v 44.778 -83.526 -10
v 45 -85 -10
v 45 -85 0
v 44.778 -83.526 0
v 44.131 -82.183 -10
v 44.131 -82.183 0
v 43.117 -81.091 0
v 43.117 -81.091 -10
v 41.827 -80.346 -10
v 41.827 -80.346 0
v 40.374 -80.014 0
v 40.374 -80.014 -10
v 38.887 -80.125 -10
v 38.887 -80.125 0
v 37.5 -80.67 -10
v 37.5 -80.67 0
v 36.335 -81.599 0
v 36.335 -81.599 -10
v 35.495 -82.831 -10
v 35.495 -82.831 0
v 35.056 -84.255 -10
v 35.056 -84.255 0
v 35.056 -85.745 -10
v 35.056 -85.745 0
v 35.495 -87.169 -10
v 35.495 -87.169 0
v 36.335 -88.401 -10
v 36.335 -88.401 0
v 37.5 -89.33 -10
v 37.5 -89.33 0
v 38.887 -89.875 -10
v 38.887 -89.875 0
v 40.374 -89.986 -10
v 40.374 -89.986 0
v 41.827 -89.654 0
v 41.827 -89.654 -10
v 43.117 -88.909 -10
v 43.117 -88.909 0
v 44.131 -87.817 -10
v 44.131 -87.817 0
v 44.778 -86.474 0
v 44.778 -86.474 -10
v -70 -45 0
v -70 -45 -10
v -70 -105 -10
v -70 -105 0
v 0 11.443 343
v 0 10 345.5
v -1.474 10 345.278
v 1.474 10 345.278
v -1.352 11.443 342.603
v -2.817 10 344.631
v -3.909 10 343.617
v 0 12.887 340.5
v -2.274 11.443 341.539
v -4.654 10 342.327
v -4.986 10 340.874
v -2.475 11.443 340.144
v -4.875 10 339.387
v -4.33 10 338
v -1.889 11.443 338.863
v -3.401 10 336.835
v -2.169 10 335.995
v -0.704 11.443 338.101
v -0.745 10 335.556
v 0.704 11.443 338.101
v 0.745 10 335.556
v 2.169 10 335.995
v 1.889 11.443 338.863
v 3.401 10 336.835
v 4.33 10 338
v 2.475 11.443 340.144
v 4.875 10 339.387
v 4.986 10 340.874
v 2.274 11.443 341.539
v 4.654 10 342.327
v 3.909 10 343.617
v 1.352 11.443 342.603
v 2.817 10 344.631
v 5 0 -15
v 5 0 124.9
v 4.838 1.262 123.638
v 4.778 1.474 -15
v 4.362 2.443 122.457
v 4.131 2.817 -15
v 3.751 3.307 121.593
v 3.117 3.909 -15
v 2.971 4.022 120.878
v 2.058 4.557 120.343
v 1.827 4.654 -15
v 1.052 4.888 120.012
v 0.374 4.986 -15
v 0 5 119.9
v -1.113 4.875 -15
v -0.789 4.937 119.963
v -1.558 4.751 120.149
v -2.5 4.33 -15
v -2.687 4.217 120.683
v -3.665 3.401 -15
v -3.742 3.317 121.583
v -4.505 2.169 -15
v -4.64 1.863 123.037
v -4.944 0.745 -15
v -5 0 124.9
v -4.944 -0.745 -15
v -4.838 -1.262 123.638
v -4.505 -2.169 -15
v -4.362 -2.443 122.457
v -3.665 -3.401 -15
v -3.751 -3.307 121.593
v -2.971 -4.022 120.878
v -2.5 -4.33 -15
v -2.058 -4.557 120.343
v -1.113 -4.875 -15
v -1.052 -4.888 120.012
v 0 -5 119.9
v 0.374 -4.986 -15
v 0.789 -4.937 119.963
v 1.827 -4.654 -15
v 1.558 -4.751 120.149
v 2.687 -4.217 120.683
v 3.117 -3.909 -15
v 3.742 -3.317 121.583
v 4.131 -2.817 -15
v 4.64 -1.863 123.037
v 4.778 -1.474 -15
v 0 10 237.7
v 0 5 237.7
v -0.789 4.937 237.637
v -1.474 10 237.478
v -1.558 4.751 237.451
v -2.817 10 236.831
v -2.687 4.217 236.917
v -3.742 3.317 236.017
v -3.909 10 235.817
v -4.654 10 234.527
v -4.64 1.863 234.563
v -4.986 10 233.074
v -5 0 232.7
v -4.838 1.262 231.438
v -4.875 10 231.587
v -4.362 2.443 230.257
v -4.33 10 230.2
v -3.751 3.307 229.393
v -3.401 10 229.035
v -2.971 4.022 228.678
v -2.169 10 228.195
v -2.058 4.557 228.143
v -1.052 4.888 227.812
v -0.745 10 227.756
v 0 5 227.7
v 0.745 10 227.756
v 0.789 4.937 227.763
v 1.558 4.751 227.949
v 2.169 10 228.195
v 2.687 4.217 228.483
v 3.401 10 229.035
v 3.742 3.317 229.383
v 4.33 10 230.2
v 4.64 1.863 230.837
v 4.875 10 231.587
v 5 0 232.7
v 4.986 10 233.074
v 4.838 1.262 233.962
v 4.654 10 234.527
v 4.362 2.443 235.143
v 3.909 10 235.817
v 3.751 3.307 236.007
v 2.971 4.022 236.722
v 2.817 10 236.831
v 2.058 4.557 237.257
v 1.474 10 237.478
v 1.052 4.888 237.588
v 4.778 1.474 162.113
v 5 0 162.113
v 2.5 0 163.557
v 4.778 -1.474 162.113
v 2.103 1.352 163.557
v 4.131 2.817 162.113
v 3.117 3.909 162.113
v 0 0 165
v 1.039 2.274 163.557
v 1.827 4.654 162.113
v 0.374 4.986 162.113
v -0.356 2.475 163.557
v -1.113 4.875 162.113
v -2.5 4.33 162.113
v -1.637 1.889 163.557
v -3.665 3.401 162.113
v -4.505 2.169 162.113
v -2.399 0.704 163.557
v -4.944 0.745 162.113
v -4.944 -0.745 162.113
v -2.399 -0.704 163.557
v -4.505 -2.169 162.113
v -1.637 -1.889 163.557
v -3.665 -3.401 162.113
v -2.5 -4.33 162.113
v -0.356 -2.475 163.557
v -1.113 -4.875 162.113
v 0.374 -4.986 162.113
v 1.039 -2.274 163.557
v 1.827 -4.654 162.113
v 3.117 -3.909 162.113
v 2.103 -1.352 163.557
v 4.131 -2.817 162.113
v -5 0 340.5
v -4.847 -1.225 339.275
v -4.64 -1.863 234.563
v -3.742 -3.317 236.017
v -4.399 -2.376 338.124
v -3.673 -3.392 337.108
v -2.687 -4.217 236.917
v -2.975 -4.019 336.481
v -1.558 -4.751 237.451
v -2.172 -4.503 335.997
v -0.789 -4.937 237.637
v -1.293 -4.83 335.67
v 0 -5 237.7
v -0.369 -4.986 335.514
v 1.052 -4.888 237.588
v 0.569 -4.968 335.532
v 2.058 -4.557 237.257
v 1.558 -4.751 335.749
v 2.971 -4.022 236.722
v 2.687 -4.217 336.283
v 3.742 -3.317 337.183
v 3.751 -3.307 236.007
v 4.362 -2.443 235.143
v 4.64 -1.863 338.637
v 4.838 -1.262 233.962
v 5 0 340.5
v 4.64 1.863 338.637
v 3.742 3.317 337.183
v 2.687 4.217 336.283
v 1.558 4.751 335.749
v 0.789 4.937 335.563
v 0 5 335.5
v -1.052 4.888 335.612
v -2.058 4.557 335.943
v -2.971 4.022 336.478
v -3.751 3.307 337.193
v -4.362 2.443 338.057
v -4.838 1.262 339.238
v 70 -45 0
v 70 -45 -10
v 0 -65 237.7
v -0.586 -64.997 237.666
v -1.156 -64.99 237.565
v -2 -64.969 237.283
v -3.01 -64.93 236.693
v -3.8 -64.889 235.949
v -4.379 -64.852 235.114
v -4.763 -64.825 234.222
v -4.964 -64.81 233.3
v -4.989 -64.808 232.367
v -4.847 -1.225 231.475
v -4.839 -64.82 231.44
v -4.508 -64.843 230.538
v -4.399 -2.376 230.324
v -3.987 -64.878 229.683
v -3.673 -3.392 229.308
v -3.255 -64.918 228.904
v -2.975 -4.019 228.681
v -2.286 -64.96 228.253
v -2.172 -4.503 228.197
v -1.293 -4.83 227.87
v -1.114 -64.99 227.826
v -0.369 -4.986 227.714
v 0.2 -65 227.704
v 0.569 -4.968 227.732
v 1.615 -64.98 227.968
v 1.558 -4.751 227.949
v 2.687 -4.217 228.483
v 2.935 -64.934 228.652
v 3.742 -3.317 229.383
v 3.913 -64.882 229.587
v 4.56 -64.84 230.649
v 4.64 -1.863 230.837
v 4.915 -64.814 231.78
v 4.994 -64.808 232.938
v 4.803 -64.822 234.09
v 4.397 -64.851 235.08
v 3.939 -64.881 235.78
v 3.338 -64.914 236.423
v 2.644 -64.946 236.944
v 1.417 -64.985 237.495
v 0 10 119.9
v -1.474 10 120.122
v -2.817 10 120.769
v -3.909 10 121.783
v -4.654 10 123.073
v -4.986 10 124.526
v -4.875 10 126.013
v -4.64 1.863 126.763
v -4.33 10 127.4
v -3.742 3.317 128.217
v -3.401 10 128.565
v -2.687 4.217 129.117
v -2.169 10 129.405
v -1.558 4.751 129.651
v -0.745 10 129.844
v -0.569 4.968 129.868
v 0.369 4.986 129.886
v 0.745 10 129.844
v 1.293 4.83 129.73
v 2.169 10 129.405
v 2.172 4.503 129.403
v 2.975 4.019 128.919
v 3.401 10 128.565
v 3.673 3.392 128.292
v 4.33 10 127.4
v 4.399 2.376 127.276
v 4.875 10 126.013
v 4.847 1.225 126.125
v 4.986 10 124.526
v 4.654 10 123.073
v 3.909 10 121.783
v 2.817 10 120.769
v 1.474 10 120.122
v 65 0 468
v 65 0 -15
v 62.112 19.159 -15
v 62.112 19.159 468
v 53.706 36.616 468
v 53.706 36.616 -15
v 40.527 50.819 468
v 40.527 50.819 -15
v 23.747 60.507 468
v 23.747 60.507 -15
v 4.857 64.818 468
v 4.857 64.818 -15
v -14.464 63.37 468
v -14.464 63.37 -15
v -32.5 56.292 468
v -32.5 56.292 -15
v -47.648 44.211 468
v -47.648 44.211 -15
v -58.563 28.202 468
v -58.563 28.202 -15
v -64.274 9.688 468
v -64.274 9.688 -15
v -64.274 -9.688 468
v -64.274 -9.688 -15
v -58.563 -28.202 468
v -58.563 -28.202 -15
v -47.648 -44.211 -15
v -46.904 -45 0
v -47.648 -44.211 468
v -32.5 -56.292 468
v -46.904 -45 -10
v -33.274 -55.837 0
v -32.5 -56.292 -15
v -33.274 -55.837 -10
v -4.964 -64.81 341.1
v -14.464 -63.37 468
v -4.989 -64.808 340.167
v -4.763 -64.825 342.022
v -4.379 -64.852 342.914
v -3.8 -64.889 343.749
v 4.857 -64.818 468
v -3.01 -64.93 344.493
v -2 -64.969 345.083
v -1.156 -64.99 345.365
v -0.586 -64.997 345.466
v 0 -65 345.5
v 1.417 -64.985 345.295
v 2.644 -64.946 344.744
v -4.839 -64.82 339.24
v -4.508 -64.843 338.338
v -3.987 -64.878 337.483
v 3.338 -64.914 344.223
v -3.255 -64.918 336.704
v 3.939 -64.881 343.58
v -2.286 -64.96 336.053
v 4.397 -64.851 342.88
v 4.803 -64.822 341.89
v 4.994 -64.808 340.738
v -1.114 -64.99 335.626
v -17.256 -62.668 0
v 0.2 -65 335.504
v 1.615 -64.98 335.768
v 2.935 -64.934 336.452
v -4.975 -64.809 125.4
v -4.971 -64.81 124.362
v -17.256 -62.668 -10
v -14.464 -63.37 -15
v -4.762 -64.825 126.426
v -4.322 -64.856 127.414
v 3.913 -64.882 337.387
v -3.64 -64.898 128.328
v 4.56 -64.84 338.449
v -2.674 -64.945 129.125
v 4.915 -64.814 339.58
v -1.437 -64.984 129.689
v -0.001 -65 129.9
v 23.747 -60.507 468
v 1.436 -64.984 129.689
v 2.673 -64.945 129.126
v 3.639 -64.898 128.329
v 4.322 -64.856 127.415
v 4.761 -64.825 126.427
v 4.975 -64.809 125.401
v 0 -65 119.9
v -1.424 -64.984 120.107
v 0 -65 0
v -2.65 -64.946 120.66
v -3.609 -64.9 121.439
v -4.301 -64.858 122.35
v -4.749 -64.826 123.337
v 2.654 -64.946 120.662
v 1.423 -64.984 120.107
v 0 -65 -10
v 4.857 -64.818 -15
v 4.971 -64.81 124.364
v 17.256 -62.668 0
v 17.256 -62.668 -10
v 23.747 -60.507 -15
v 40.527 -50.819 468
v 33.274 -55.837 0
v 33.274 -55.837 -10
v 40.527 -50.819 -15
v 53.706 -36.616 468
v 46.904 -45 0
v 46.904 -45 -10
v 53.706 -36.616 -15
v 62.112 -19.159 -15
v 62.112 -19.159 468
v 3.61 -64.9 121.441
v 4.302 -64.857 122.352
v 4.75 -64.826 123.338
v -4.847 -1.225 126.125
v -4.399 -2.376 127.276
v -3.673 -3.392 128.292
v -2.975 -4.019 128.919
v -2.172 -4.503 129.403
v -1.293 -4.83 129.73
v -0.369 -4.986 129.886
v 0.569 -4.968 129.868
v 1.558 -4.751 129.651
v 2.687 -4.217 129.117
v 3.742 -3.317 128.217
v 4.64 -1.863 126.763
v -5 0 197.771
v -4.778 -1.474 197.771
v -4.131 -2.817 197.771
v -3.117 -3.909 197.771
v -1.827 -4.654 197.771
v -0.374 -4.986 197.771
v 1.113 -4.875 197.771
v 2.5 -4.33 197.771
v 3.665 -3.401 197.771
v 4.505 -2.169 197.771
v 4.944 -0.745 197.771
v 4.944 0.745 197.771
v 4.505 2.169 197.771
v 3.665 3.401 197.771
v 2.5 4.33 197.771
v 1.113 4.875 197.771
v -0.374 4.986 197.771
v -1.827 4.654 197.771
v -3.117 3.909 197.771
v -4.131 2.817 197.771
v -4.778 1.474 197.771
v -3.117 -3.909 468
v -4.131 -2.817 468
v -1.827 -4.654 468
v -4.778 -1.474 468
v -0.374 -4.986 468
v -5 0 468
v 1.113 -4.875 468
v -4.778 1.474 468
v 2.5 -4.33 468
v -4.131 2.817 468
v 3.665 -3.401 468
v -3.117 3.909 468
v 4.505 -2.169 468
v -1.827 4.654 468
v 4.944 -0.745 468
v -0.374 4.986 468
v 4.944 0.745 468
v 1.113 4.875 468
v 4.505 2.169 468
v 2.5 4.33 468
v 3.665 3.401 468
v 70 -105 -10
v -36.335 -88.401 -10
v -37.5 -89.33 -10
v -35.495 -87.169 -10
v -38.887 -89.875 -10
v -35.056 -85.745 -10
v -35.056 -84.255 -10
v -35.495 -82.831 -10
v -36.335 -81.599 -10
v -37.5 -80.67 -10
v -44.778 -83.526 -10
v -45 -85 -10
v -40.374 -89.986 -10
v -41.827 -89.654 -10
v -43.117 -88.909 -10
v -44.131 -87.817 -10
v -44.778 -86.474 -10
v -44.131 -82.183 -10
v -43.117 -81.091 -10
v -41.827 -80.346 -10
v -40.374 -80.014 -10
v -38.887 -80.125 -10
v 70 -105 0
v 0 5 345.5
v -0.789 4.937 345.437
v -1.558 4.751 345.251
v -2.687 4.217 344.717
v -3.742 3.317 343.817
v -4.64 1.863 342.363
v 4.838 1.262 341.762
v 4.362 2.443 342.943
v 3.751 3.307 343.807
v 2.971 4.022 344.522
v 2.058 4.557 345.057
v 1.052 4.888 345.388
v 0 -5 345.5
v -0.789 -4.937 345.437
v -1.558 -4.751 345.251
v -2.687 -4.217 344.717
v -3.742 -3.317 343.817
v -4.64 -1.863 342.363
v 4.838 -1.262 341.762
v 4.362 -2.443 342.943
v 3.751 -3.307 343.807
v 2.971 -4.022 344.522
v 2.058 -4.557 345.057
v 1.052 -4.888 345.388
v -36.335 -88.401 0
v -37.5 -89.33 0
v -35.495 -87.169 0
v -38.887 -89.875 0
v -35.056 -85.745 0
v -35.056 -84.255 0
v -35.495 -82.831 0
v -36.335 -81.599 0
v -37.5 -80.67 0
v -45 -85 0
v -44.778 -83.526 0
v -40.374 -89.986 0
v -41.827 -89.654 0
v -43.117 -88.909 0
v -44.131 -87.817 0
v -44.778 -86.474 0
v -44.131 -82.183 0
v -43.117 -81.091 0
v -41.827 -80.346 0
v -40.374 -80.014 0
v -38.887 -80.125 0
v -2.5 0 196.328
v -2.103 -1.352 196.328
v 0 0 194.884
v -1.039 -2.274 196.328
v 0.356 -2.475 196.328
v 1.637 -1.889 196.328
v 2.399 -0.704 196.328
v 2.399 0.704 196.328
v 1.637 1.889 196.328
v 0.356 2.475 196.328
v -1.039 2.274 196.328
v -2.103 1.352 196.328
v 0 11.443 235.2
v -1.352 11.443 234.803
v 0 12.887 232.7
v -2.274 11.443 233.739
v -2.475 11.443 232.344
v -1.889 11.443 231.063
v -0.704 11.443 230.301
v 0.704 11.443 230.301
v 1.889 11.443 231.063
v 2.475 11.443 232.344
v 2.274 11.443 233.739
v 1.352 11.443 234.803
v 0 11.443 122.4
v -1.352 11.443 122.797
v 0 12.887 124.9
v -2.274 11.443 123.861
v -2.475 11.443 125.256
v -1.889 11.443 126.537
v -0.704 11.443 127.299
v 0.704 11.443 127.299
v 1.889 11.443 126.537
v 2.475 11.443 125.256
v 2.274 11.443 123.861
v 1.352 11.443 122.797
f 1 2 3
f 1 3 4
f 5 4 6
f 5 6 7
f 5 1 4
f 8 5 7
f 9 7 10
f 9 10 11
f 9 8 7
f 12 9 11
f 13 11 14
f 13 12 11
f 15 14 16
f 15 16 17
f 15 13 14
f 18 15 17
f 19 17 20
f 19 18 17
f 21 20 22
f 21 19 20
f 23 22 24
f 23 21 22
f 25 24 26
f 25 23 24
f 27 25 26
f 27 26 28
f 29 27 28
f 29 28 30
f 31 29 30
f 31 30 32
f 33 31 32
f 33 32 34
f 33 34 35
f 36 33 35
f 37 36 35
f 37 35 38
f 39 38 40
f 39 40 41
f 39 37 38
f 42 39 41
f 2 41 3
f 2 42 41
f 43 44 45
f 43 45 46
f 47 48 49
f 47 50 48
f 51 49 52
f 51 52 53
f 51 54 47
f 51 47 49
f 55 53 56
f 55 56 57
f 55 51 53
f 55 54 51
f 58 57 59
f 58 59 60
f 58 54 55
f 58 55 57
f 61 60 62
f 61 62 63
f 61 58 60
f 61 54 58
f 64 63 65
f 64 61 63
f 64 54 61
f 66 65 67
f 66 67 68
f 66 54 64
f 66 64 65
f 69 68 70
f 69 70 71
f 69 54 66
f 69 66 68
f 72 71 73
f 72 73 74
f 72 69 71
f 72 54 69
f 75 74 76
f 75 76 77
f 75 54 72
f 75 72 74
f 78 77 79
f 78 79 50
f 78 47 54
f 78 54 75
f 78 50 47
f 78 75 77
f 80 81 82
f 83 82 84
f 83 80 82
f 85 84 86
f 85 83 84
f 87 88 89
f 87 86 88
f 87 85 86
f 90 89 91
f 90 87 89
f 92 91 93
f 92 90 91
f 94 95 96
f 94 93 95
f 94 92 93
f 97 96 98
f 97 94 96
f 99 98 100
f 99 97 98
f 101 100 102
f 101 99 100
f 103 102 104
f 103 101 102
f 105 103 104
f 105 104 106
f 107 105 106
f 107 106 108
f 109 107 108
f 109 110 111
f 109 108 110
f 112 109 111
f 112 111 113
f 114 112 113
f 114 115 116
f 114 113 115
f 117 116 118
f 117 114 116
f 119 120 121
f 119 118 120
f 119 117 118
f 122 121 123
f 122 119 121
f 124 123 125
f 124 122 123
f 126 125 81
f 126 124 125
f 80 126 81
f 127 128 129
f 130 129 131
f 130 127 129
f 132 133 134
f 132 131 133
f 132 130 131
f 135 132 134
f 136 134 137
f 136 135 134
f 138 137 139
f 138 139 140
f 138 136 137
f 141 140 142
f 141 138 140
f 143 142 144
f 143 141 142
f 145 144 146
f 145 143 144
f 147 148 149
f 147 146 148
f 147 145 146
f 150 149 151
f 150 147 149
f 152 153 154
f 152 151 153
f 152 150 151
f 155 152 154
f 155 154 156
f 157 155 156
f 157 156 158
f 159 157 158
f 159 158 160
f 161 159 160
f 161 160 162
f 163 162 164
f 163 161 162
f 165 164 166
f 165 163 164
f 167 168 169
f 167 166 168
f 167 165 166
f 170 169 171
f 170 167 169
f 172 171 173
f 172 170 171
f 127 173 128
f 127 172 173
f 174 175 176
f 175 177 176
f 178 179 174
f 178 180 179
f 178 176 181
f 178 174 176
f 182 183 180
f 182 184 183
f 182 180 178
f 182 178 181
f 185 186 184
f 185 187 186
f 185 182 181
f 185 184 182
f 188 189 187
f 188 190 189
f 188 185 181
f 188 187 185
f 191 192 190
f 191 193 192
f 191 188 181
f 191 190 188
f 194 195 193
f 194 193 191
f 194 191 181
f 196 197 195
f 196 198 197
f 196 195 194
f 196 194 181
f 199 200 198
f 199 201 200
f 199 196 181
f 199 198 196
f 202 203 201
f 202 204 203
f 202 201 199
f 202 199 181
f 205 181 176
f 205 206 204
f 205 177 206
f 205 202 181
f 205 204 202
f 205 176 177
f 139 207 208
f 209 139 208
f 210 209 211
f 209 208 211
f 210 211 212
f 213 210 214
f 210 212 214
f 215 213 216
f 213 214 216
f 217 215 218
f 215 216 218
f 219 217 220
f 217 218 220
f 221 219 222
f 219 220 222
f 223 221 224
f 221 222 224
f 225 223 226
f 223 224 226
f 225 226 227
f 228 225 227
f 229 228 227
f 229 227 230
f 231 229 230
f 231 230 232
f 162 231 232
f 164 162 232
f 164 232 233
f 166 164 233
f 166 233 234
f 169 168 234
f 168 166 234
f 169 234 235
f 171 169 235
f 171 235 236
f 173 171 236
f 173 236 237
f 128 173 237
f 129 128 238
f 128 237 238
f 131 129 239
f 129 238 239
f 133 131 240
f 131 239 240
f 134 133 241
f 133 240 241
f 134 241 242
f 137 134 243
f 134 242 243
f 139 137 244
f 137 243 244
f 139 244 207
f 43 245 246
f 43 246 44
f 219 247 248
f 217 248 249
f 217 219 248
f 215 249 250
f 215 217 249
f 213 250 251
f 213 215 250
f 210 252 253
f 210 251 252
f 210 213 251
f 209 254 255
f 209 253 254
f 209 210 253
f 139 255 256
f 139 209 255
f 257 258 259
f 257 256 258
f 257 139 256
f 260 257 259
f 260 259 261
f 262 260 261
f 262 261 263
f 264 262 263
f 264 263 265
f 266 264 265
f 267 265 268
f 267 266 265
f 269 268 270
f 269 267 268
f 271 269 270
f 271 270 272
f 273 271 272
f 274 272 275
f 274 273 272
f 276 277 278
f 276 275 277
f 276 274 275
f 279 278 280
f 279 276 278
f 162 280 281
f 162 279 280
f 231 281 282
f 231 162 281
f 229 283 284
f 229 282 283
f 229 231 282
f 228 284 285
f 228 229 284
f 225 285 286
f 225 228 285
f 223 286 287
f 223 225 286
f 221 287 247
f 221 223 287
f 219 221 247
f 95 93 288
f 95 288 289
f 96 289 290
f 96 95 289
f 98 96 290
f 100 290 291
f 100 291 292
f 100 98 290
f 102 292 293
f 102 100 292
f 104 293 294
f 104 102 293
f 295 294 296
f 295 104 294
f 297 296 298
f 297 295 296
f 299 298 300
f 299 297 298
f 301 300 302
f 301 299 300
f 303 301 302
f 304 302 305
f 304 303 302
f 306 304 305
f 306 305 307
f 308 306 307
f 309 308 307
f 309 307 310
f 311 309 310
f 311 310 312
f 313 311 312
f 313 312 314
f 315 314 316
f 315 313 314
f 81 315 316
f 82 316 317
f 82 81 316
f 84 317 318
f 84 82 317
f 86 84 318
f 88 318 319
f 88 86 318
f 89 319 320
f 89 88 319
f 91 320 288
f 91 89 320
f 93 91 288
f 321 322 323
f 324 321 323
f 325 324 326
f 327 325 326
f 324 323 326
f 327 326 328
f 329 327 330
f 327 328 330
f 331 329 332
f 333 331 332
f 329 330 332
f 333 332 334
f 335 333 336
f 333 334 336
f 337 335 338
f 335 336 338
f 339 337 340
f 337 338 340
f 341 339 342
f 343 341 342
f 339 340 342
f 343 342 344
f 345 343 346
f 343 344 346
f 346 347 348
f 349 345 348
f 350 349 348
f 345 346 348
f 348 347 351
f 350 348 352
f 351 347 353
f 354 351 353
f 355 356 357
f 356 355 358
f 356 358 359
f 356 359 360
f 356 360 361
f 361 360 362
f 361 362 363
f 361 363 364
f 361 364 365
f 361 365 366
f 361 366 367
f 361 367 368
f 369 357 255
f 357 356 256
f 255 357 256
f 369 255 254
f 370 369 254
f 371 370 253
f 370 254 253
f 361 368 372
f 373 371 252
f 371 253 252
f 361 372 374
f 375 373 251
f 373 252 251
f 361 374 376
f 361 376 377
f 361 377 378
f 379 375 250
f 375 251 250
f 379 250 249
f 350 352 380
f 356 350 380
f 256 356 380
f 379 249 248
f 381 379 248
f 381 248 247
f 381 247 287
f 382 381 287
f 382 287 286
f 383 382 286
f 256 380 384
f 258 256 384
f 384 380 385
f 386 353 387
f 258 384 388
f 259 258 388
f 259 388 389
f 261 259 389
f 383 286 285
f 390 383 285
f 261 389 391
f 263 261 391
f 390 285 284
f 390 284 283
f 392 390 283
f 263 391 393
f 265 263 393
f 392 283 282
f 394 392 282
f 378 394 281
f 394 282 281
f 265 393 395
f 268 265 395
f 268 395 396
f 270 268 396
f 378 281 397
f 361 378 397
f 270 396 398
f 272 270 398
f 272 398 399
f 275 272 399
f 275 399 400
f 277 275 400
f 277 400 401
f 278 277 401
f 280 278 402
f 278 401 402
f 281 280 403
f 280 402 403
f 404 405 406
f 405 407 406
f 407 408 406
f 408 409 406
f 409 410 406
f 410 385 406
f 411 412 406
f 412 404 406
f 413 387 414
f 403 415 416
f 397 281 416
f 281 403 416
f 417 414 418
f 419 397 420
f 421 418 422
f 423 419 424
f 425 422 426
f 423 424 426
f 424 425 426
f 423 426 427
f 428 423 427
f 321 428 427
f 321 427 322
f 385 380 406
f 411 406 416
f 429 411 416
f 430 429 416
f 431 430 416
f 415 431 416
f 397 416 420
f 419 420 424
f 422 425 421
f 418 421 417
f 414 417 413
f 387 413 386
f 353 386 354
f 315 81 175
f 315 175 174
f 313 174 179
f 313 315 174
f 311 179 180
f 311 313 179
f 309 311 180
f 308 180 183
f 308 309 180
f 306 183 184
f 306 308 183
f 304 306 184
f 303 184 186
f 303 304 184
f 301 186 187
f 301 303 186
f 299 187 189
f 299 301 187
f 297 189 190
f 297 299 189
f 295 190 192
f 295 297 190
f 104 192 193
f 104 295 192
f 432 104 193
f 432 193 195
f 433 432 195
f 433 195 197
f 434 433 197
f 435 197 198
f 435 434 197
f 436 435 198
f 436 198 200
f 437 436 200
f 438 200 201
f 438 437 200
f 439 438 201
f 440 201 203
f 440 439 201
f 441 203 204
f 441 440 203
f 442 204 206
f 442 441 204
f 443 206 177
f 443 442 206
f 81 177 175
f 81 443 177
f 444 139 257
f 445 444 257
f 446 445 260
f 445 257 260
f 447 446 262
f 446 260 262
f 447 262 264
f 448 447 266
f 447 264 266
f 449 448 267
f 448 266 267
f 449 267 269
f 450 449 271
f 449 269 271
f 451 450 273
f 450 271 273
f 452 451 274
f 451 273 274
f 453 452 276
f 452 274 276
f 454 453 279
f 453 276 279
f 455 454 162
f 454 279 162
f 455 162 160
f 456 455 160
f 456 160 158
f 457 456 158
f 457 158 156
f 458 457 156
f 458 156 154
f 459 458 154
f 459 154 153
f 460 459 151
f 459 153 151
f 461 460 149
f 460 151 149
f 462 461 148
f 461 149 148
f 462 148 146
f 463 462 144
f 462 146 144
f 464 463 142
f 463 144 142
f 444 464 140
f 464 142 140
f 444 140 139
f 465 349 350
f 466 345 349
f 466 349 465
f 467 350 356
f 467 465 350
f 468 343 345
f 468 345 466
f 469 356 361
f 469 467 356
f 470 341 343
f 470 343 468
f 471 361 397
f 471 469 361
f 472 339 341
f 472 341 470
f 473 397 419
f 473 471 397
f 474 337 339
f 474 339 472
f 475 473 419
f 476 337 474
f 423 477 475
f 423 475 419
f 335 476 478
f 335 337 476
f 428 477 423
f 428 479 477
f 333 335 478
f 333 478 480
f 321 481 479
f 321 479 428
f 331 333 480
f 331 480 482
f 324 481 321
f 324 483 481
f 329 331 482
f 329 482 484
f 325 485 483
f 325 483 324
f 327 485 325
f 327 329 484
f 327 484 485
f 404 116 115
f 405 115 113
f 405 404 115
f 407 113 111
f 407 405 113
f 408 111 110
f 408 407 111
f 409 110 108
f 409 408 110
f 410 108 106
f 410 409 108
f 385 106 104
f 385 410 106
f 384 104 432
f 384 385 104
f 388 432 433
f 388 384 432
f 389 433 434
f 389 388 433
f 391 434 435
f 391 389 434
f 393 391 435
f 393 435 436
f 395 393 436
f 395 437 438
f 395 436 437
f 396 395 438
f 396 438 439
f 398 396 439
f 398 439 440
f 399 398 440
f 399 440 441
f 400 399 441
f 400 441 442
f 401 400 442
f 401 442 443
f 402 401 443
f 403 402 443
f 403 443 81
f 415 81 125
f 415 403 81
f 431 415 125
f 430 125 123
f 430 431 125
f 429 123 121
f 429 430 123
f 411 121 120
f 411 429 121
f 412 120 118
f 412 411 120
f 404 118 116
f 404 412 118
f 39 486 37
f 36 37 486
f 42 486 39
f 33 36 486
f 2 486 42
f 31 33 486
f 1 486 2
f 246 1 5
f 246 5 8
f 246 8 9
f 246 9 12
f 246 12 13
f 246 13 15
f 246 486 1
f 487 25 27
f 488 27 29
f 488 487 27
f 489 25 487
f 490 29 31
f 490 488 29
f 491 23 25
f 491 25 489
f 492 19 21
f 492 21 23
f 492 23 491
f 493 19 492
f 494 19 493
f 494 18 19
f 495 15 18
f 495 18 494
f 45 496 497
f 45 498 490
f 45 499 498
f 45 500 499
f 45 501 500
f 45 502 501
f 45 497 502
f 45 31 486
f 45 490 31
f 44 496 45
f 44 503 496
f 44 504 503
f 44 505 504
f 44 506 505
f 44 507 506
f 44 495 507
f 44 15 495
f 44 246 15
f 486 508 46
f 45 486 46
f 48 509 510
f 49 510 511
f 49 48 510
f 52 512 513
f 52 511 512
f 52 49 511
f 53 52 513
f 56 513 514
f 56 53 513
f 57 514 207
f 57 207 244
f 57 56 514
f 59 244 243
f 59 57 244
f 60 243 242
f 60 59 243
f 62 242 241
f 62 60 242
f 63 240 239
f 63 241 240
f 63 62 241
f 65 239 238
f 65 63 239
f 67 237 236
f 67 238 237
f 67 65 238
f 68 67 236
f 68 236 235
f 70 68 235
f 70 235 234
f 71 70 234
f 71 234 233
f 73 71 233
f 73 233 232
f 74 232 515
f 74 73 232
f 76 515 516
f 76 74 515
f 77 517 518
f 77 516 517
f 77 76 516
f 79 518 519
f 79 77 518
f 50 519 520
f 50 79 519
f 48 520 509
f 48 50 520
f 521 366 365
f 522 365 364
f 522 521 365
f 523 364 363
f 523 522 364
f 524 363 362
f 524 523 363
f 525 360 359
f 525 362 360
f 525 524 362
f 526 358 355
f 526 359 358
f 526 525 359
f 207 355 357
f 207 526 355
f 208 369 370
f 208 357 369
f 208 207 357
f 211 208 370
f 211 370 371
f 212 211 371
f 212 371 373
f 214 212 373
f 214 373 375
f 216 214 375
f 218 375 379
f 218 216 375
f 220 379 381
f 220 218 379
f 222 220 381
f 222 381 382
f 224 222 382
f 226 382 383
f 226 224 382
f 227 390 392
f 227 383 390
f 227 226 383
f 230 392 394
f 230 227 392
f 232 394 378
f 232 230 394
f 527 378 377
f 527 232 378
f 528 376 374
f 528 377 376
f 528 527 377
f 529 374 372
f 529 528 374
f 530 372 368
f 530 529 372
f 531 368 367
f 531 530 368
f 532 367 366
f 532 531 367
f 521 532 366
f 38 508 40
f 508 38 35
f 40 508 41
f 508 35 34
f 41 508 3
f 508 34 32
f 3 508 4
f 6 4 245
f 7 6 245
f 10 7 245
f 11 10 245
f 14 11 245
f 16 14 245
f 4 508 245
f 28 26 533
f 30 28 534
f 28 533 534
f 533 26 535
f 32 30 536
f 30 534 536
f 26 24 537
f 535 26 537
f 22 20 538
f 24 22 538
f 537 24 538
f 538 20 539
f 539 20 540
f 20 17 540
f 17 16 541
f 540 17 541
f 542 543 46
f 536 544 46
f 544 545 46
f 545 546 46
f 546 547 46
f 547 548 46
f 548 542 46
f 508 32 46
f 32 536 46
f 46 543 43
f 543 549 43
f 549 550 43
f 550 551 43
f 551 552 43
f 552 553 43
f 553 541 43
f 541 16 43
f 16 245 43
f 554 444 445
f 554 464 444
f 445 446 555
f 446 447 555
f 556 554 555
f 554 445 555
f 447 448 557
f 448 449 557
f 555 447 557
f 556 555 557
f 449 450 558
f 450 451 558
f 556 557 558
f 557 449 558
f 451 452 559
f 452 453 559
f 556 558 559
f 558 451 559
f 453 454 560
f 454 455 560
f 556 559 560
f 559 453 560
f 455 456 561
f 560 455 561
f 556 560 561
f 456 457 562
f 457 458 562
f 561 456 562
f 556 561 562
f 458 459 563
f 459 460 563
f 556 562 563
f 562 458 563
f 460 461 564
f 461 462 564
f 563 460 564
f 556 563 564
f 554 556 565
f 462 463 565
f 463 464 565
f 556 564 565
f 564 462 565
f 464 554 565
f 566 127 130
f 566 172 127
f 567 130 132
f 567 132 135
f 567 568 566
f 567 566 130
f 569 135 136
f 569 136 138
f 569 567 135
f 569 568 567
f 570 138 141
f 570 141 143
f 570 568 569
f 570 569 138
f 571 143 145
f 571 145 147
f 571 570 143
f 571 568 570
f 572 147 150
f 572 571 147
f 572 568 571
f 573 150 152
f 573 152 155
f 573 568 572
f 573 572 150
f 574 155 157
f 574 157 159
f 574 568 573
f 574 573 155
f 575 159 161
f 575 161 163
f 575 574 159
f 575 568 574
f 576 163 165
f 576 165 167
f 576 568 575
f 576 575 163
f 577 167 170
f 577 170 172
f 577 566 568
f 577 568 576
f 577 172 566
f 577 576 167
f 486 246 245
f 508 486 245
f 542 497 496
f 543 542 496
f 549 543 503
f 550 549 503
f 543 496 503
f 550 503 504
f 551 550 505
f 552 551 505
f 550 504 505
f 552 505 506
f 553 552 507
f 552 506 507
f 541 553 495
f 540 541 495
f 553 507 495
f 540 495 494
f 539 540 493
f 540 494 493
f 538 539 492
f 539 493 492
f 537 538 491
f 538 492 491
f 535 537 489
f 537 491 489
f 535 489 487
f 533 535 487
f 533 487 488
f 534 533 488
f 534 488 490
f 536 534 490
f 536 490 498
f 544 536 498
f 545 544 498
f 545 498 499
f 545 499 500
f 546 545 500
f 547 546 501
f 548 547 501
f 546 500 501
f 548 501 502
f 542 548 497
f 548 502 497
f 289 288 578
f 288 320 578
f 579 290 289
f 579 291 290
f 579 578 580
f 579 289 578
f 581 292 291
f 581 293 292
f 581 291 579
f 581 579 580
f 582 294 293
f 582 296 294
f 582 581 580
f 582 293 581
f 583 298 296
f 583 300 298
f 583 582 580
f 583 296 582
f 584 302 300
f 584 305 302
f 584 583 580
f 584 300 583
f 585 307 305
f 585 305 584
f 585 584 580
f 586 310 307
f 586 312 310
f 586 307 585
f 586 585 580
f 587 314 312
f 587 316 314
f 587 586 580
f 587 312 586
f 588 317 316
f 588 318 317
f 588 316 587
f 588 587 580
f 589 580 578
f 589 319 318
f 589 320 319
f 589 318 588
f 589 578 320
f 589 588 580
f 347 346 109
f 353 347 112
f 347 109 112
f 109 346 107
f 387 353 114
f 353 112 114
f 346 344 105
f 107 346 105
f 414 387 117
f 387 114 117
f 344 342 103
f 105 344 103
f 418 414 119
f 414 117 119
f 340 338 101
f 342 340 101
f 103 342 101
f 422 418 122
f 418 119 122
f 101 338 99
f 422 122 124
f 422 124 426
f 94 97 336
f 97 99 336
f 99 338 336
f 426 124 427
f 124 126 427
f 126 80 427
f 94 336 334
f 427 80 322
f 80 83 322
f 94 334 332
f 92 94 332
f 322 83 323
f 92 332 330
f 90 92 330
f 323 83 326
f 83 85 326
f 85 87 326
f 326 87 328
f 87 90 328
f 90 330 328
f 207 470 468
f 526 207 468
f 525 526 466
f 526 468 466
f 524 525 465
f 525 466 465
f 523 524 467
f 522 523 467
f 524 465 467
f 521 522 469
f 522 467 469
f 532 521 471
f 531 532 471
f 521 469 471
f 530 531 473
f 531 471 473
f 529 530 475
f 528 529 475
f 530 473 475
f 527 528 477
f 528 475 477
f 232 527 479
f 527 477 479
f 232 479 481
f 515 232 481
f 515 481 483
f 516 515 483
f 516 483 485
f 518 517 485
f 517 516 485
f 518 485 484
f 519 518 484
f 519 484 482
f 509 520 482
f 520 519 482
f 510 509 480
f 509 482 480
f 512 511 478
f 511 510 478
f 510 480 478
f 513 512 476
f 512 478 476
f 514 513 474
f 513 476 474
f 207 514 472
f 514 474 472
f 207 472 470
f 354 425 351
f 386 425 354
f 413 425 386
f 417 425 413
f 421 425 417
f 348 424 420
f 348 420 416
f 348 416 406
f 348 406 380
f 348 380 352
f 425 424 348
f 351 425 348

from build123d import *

# Parameters (mm, degrees)
EXTRUDEASSE_DEPTH      = 468
EXTRUDEASSE_DEPTH_BACK = 15
SKETCH1_R              = 65
SKETCH6_W              = 125.765742684
SKETCH6_H              = 20
CUT_EXTRUDE1_DEPTH     = 10
SKETCH7_W              = 70
SKETCH7_H              = 10
EXTRPIASTRINA_DEPTH    = 60
SKETCH8_R              = 5
FORO_DEPTH             = 10


with BuildPart() as part:
    # Sketch1 → ExtrudeAsse (new, two sides: drawn at the far end of the back side and taken through both)
    with BuildSketch(Plane.XY.offset(-EXTRUDEASSE_DEPTH_BACK)):
        Circle(SKETCH1_R)
    extrude(amount=EXTRUDEASSE_DEPTH + EXTRUDEASSE_DEPTH_BACK)

    # Sketch3 → Cut-Revolve1 (revolve, cut)
    with BuildSketch(Plane(origin=(0, 0, 0), x_dir=(0, 0, -1), z_dir=(1, 0, 0)), mode=Mode.PRIVATE) as cut_revolve1_sk:
        Polygon((-335.5, -65), (-335.5, 10), (-340.5, 12.886751346), (-340.5, 10), (-340.5, -65), align=None)
    revolve(cut_revolve1_sk.sketch.rotate(Axis((0, 12.886751346, 340.5), (0, -1, 0)), 180), axis=Axis((0, 12.886751346, 340.5), (0, -1, 0)), mode=Mode.SUBTRACT)

    # Sketch3<3> → Cut-Revolve2 (revolve, cut)
    with BuildSketch(Plane(origin=(0, 0, 0), x_dir=(0, 0, -1), z_dir=(1, 0, 0)), mode=Mode.PRIVATE) as cut_revolve2_sk:
        Polygon((-232.7, -65), (-227.7, -65), (-227.7, 10), (-232.7, 12.886751346), (-232.7, 0), align=None)
    revolve(cut_revolve2_sk.sketch.rotate(Axis((0, 0, 232.7), (0, -1, 0)), 180), axis=Axis((0, 0, 232.7), (0, -1, 0)), mode=Mode.SUBTRACT)

    # Sketch4 → Cut-Revolve5 (revolve, cut)
    with BuildSketch(Plane(origin=(0, 0, 0), x_dir=(0, 0, -1), z_dir=(1, 0, 0)), mode=Mode.PRIVATE) as cut_revolve5_sk:
        Polygon((-468, 0), (-197.77110668, 0), (-194.884355334, 0), (-197.77110668, -5), (-468, -5), align=None)
    revolve(cut_revolve5_sk.sketch.rotate(Axis((0, 0, 0), (0, 0, 1)), 270), axis=Axis((0, 0, 0), (0, 0, 1)), mode=Mode.SUBTRACT)

    # Sketch5 → Cut-Revolve6 (revolve, cut)
    with BuildSketch(Plane(origin=(0, 0, 0), x_dir=(0, 0, -1), z_dir=(1, 0, 0)), mode=Mode.PRIVATE) as cut_revolve6_sk:
        Polygon((15, -5), (15, 0), (-162.113248654, 0), (-165, 0), (-162.113248654, -5), align=None)
    revolve(cut_revolve6_sk.sketch.rotate(Axis((0, 0, 0), (0, 0, 1)), 90), axis=Axis((0, 0, 0), (0, 0, 1)), mode=Mode.SUBTRACT)

    # Sketch3<5> → Cut-Revolve7 (revolve, cut)
    with BuildSketch(Plane(origin=(0, 0, 0), x_dir=(0, 0, -1), z_dir=(1, 0, 0))):
        Polygon((-124.9, 10), (-124.9, 12.886751346), (-119.9, 10), (-119.9, -65), (-124.9, -65), align=None)
    revolve(axis=Axis((0, -65, 124.9), (0, 1, 0)), mode=Mode.SUBTRACT)

    # Sketch6 → Cut-Extrude1 (cut)
    with BuildSketch(Plane(origin=(0, 0, 0), x_dir=(-1, 0, 0), z_dir=(0, 0, -1))):
        with Locations((-8.867505506, -55)):
            Rectangle(SKETCH6_W, SKETCH6_H)
    extrude(amount=CUT_EXTRUDE1_DEPTH, mode=Mode.SUBTRACT)


with BuildPart() as body_2:
    # Sketch7 → ExtrPiastrina (new body)
    with BuildSketch(Plane.XZ.offset(45)):
        with Locations((-35, -5)):
            Rectangle(SKETCH7_W, SKETCH7_H)
    extrude(amount=EXTRPIASTRINA_DEPTH)

    # Sketch8 → Foro (cut)
    with BuildSketch(Plane(origin=(0, 0, -10), x_dir=(-1, 0, 0), z_dir=(0, 0, -1))):
        with Locations((40, -85)):
            Circle(SKETCH8_R)
    extrude(amount=-FORO_DEPTH, mode=Mode.SUBTRACT)

    # Mirror1: body 2 across plane


with BuildPart() as body_2_1:
    add(body_2.part)
    add(body_2.part.mirror(Plane(origin=(0, -105, -10), x_dir=(0, 0, 1), z_dir=(-1, 0, 0))))


solid = Compound([part.part, body_2_1.part])
